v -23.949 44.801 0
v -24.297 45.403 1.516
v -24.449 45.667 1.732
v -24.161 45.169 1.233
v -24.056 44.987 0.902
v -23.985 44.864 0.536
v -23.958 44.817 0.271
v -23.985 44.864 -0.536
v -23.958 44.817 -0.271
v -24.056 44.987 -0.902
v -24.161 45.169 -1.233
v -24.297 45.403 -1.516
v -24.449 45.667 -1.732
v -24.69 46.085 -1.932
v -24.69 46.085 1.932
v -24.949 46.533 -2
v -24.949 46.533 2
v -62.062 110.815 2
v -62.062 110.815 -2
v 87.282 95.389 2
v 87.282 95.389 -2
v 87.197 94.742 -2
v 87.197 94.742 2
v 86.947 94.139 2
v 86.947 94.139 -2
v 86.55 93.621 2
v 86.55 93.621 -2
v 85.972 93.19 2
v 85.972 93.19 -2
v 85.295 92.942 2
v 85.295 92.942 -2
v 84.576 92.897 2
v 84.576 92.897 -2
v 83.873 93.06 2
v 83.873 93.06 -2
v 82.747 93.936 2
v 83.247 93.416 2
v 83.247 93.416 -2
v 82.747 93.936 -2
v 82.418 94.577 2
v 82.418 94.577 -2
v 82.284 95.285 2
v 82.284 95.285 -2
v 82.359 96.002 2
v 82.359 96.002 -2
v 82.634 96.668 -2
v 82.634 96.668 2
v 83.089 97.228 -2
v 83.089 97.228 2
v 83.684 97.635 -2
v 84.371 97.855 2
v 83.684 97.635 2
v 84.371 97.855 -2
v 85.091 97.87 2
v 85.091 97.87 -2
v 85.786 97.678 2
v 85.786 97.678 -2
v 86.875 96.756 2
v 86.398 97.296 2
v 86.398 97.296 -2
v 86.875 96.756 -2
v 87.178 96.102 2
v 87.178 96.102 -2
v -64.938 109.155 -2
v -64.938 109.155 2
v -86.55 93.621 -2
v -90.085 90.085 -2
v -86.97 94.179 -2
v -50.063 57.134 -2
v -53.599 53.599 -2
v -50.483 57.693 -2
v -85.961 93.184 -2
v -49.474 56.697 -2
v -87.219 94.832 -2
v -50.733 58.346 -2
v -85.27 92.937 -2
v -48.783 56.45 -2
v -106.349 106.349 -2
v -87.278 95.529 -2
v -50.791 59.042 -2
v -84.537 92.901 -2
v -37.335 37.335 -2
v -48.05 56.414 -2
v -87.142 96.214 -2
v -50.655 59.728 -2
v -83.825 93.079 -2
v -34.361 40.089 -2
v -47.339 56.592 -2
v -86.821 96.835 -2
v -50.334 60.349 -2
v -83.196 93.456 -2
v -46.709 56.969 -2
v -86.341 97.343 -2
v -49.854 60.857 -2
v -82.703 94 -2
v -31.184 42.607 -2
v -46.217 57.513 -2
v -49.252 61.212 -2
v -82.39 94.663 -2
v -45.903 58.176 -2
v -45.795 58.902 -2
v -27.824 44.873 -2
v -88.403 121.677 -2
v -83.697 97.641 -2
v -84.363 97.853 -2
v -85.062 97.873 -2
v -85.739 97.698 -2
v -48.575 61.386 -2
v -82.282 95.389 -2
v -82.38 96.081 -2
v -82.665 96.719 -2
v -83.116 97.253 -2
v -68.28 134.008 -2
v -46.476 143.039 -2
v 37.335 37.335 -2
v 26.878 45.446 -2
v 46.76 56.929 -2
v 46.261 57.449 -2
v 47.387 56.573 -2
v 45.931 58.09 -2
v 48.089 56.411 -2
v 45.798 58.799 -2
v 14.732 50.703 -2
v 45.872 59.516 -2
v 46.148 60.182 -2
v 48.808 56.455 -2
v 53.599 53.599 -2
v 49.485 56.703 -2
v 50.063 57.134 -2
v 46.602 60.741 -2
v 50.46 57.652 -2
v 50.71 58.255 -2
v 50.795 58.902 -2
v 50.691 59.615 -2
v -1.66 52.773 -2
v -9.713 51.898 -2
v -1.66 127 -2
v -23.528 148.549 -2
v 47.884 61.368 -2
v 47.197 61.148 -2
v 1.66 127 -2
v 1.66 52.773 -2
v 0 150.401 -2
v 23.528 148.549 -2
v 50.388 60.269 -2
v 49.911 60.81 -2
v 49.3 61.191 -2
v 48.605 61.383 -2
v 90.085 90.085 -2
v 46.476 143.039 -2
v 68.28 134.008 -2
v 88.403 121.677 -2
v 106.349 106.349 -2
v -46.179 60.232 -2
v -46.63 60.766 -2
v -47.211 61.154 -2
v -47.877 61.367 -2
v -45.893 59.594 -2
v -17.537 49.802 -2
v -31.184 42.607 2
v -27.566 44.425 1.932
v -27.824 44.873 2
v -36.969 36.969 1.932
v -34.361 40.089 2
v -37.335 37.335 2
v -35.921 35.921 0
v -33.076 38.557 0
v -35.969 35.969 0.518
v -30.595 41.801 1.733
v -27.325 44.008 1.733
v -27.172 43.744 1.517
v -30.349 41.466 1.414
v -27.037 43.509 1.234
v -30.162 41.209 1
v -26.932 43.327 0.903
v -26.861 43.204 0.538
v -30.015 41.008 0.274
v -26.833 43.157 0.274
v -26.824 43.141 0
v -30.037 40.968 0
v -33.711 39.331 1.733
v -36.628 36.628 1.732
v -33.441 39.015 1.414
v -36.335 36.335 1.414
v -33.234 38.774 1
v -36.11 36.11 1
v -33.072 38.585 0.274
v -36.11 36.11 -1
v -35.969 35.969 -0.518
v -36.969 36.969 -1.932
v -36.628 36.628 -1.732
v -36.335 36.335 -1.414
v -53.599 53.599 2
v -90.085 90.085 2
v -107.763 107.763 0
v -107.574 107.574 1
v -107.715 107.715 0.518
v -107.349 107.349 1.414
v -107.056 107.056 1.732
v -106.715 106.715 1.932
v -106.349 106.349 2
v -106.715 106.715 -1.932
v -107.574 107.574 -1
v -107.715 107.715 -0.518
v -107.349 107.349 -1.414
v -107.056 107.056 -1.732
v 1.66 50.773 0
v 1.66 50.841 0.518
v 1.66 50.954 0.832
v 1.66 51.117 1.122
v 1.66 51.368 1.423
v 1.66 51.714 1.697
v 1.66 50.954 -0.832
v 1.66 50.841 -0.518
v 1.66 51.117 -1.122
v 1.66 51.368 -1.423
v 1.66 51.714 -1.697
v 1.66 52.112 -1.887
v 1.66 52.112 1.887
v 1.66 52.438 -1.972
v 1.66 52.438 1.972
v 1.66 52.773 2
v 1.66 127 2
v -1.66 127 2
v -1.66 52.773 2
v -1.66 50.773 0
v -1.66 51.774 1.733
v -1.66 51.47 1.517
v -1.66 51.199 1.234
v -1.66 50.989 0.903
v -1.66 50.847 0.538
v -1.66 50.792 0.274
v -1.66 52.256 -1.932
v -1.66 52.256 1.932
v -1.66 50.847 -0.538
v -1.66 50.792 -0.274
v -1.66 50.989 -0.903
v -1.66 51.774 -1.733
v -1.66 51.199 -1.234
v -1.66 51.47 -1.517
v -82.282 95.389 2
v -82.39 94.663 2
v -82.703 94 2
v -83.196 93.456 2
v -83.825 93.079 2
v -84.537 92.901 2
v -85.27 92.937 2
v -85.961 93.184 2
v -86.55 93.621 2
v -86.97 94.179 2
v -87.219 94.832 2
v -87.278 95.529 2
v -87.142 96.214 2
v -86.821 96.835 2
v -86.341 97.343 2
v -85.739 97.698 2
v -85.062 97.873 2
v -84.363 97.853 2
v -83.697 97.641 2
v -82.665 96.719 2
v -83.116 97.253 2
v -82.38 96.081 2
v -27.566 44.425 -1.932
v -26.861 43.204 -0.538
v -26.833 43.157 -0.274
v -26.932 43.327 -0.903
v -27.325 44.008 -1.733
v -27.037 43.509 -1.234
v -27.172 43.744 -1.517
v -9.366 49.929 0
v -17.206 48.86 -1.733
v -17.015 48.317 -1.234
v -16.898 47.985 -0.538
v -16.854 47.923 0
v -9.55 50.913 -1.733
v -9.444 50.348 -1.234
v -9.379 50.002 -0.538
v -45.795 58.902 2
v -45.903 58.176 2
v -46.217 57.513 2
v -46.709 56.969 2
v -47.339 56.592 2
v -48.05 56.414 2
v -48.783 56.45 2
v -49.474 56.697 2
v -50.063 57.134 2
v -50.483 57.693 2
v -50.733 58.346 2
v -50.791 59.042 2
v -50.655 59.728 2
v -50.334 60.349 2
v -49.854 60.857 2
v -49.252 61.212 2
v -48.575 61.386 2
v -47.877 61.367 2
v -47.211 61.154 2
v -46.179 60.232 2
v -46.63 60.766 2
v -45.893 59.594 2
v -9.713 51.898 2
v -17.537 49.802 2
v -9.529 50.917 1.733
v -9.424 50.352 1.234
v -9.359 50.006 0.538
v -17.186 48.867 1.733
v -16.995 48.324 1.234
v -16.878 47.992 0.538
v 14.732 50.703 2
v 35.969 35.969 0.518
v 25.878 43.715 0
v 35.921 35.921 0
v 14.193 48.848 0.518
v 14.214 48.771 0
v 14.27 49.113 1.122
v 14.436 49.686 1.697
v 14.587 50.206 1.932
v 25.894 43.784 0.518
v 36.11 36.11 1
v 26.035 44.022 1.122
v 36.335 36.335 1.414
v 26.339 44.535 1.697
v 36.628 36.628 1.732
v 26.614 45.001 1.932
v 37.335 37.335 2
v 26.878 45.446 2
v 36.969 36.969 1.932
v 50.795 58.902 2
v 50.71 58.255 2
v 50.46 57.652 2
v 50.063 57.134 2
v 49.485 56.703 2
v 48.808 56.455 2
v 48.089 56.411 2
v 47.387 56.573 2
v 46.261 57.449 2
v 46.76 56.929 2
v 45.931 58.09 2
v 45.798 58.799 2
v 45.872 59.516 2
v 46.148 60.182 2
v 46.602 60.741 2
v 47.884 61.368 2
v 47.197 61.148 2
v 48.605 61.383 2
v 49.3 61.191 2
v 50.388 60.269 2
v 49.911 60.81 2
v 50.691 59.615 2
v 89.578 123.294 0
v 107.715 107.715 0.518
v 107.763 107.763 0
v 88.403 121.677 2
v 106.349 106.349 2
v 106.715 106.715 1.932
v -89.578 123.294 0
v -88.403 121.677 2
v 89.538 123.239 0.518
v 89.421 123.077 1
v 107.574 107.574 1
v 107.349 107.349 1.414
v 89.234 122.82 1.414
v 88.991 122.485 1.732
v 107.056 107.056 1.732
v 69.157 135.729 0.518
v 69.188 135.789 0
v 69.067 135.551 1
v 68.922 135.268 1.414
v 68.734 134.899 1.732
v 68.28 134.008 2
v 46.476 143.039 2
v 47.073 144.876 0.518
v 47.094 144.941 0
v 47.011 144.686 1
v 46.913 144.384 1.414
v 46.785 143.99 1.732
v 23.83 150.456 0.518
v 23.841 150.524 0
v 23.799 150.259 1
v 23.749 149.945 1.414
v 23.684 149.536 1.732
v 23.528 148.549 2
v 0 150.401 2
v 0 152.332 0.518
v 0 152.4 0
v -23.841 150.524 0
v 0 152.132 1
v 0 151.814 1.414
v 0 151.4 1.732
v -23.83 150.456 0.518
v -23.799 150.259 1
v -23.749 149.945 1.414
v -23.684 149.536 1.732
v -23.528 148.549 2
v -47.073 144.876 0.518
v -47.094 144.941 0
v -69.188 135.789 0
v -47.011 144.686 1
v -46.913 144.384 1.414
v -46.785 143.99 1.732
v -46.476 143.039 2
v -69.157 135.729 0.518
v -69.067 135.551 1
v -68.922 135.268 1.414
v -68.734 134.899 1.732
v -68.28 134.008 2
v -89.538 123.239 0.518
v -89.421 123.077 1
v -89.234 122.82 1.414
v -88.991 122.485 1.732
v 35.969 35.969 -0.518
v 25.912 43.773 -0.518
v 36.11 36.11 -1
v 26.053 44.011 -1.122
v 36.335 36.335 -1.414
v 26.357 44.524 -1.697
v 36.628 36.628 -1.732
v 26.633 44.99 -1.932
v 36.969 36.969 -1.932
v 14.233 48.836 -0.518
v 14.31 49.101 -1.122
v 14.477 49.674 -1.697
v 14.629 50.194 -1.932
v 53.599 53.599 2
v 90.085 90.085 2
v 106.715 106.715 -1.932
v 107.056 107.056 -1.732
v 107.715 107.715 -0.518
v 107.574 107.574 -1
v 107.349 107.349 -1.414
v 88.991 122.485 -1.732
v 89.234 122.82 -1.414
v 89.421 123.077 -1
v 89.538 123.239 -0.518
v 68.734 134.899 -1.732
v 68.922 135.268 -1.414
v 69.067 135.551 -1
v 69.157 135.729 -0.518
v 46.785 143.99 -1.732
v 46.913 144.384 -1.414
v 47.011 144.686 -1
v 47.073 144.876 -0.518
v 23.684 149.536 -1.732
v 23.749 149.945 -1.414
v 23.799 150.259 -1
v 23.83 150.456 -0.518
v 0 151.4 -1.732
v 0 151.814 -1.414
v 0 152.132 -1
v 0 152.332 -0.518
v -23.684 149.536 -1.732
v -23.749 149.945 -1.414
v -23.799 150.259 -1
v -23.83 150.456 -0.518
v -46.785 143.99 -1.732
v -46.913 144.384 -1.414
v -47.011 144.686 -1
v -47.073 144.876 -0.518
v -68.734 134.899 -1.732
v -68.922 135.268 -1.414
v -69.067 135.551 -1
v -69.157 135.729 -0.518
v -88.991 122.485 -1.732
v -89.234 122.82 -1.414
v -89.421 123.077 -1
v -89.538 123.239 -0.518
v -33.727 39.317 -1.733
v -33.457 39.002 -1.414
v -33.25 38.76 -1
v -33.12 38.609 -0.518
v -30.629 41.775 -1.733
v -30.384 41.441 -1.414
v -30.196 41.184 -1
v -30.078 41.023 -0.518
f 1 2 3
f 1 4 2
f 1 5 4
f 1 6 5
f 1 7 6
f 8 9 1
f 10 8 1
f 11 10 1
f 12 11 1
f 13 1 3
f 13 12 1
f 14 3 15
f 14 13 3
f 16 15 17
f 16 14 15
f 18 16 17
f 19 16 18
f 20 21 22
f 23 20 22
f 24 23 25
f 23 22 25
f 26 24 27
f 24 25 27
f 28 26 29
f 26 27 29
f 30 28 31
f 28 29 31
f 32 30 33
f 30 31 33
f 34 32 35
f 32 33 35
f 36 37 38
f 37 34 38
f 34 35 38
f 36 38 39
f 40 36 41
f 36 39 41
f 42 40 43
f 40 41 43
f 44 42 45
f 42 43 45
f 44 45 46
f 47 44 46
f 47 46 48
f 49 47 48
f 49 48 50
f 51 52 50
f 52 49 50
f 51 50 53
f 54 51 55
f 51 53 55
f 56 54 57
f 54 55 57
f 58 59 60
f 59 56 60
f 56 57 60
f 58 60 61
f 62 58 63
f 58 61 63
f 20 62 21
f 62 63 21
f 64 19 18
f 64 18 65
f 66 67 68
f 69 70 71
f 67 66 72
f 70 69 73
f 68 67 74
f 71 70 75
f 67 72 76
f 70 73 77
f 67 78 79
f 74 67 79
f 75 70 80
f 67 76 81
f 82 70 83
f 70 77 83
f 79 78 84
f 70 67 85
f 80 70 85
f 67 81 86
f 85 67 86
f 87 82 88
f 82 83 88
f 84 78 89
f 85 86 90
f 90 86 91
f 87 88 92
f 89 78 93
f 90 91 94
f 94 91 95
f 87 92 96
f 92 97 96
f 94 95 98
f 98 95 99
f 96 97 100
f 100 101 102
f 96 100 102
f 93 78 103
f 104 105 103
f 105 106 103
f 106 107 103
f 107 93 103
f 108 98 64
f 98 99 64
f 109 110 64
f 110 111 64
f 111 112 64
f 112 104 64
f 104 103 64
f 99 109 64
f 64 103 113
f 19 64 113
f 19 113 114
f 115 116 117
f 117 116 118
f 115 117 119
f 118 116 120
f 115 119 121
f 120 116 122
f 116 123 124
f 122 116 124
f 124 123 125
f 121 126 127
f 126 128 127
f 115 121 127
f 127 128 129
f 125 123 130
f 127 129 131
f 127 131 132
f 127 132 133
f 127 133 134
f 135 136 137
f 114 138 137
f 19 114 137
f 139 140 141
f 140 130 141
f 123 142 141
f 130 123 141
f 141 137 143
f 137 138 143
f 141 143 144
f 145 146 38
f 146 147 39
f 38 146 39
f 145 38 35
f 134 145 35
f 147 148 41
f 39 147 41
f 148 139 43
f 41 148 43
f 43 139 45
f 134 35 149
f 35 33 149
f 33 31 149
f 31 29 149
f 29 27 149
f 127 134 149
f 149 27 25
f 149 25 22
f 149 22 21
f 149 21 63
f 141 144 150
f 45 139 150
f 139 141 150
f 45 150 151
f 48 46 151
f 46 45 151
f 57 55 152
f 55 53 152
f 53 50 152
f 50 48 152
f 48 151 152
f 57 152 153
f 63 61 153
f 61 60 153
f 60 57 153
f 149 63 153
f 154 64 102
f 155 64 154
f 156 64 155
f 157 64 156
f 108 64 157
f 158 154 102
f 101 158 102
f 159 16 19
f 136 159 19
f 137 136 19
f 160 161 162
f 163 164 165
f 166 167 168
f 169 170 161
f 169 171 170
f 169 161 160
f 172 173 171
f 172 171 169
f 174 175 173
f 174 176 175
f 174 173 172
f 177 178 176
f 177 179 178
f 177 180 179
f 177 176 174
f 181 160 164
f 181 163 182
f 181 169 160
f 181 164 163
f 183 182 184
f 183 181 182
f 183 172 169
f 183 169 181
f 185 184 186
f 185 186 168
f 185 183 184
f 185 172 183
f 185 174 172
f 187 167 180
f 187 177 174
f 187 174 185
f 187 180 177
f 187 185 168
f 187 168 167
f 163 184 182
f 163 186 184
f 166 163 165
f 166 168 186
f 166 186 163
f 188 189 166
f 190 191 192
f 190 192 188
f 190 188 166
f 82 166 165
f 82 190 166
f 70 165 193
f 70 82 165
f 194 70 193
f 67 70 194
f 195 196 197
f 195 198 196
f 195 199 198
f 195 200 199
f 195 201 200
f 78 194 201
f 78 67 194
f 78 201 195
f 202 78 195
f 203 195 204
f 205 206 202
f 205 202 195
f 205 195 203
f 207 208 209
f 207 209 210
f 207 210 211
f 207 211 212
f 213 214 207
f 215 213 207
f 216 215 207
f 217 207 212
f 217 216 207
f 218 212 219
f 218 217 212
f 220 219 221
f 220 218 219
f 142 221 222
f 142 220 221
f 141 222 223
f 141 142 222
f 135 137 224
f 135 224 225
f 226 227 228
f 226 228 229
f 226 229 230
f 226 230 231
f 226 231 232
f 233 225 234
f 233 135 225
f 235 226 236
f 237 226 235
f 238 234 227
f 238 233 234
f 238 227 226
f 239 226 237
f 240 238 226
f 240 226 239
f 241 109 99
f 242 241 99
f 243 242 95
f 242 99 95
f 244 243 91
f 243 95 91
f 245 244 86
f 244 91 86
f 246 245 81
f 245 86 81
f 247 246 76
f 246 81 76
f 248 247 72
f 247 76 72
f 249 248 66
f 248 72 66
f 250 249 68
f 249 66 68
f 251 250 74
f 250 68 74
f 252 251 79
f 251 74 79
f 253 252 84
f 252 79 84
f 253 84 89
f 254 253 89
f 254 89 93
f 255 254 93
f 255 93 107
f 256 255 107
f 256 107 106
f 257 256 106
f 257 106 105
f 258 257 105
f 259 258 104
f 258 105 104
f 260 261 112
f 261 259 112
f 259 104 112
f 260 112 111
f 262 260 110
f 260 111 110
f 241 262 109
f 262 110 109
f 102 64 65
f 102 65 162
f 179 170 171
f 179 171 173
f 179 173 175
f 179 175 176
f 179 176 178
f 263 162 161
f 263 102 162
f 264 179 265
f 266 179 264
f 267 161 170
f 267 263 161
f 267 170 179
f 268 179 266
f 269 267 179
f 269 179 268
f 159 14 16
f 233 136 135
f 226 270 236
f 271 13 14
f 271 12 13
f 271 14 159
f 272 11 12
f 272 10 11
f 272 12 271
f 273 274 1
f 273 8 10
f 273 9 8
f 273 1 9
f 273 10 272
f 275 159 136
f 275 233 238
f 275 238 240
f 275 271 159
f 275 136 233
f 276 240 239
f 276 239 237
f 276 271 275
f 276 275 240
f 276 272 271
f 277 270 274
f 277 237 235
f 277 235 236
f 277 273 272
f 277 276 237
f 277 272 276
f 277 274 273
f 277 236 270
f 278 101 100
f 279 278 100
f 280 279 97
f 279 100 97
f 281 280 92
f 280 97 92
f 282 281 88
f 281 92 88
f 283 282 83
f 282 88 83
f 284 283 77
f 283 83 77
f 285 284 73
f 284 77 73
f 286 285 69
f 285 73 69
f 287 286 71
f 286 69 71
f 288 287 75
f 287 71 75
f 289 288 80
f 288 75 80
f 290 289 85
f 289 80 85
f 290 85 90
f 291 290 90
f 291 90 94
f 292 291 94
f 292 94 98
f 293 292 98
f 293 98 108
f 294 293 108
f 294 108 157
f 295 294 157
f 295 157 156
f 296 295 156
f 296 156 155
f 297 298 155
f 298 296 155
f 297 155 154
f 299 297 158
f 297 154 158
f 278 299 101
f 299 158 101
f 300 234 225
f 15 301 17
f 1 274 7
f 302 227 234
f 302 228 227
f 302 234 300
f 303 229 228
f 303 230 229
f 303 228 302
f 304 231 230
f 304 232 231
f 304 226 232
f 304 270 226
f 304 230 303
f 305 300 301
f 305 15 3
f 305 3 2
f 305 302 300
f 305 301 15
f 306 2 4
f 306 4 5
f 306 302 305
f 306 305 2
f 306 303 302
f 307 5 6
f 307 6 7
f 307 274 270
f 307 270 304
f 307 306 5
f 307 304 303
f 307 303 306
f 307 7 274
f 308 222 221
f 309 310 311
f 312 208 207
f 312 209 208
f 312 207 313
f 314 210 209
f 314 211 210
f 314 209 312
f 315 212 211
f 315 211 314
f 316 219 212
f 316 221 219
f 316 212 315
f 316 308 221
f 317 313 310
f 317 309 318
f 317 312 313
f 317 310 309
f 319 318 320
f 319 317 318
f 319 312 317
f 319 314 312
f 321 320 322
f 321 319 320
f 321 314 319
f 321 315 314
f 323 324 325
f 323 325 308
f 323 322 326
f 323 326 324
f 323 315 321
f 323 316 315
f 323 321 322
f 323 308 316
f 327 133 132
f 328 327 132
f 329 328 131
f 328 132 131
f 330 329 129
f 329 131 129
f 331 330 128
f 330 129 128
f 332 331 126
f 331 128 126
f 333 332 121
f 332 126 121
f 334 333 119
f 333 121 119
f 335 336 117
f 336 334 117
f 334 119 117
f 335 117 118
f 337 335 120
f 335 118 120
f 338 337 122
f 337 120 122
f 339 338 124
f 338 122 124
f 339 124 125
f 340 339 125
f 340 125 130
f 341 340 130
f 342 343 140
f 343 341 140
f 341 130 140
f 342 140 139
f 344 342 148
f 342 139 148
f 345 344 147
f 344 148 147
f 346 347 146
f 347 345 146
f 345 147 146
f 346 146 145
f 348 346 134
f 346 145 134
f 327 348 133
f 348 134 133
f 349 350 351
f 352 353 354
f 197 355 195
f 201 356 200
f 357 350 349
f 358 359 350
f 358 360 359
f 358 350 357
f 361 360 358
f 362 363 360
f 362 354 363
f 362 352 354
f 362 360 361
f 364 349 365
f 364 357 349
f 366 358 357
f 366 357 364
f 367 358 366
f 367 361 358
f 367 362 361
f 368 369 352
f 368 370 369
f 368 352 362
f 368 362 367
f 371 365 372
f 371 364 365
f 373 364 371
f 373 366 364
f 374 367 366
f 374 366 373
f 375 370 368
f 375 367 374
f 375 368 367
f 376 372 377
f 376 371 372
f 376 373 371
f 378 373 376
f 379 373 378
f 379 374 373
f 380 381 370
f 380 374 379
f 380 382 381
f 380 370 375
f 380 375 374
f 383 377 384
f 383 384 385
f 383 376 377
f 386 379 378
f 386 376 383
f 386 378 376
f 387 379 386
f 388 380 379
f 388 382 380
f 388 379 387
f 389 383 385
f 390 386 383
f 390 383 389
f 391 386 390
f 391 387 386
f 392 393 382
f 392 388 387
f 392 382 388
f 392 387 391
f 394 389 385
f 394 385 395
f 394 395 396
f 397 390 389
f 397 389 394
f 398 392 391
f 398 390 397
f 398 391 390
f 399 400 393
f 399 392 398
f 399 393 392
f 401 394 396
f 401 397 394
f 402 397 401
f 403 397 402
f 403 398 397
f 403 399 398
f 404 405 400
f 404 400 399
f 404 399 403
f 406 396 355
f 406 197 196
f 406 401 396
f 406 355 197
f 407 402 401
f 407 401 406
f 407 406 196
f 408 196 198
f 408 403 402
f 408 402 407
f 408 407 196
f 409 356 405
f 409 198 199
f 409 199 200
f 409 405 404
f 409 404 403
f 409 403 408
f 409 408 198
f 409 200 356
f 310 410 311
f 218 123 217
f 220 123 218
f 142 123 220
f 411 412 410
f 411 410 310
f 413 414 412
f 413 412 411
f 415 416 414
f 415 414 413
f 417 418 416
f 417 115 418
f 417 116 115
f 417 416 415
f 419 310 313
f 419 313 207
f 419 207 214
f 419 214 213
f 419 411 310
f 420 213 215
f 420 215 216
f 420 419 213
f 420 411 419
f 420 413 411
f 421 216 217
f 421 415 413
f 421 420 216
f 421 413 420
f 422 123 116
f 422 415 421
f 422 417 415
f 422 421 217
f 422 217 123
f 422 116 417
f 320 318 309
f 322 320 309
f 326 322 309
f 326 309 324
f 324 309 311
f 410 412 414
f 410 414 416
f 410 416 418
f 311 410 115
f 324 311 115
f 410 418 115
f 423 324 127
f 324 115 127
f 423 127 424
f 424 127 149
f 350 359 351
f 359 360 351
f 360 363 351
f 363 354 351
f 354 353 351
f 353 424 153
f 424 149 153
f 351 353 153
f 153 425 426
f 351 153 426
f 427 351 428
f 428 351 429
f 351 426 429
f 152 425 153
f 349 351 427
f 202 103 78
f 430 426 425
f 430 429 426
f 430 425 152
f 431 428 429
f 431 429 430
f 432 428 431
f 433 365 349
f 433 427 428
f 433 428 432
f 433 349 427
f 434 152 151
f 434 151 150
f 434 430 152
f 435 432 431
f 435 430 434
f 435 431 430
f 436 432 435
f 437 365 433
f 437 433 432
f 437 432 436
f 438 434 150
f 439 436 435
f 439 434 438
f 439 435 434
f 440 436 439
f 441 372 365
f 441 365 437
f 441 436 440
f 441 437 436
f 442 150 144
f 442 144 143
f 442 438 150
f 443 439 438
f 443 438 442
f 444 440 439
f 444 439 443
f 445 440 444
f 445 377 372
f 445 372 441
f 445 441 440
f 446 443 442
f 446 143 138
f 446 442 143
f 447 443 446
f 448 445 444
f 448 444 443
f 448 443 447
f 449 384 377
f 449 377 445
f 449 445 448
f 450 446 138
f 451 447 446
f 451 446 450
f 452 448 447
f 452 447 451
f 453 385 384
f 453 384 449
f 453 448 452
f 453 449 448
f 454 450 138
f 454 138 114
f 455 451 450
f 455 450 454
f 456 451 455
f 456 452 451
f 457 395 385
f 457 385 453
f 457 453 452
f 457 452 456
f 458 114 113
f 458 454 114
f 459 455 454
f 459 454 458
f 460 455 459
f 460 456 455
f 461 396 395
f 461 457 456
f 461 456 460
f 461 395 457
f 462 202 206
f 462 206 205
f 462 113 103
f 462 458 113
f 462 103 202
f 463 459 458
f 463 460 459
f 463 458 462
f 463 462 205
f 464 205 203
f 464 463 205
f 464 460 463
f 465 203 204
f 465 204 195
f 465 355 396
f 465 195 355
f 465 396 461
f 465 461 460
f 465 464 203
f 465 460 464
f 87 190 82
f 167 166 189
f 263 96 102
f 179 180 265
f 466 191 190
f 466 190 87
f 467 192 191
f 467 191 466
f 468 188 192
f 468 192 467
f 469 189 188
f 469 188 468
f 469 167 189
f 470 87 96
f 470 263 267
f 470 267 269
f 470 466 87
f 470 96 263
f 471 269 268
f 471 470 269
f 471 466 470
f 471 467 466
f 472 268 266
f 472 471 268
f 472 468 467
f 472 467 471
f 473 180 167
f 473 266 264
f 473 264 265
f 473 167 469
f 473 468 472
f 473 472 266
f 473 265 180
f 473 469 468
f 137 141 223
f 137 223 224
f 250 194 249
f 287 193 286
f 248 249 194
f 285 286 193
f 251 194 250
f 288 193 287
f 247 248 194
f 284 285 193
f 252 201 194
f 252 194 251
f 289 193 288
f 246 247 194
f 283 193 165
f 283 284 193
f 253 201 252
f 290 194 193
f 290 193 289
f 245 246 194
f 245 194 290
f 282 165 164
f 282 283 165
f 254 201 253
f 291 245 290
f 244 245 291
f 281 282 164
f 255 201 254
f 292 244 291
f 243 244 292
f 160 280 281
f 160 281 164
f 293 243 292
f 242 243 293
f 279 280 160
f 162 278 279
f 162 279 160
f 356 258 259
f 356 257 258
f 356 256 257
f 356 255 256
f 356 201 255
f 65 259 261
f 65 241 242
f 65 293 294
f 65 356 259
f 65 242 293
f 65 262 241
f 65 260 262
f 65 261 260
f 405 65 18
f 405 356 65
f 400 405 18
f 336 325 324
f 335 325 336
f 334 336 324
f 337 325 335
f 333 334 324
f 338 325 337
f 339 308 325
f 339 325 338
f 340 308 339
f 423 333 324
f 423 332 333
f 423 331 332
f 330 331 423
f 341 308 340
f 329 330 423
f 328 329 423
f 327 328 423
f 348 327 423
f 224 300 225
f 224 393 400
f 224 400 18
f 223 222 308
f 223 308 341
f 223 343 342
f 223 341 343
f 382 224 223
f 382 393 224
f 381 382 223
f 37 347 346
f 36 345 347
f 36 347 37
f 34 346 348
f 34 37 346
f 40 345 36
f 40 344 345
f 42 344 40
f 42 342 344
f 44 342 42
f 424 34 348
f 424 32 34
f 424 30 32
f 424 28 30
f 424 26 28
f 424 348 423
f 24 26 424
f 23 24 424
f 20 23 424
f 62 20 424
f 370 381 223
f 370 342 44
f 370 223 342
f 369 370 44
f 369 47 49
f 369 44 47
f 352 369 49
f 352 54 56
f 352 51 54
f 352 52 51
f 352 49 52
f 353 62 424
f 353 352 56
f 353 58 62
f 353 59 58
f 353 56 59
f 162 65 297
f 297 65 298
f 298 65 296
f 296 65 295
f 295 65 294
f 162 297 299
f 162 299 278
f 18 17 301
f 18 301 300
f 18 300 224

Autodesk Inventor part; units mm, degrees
ref_plane "YZ Plane" through (0, 0, 0) normal (1, 0, 0) x (0, 1, 0)
ref_plane "XZ Plane" through (0, 0, 0) normal (0, 1, 0) x (-1, 0, 0)
ref_plane "XY Plane" through (0, 0, 0) normal (0, 0, 1) x (1, 0, 0)
sketch "Sketch1" plane through (0, 0, 0) normal (0, 0, 1) x (1, 0, 0)
  arc A0 (107.7631, -107.7631) -> (-107.7631, 107.7631) centre (0, 0) ccw
  line L0 (152.4, 0) -> (127, 0)
  line L1 (127, -1.66) -> (127, 1.66)
  line L2 (127, 1.66) -> (50.7729, 1.66)
  line L3 (50.7729, -1.66) -> (127, -1.66)
  line L4 (-64.9376, 109.1552) -> (-26.824, 43.1406)
  line L5 (-23.9488, 44.8006) -> (-62.0624, 110.8152)
  line L6 (-1.66, 127) -> (-1.66, 50.7729)
  line L7 (1.66, 50.7729) -> (1.66, 127)
  line L8 (1.66, 127) -> (-1.66, 127)
  line L9 (-62.0624, 110.8152) -> (-64.9376, 109.1552)
  line L10 (35.921, 35.921) -> (107.7631, 107.7631)
  line L11 (0, 0) -> (152.4, 0) construction
  line L12 (0, 0) -> (152.4, 0) construction
  line L13 (107.7631, -107.7631) -> (35.921, -35.921)
  line L14 (-35.921, 35.921) -> (-107.7631, 107.7631)
  arc A1 (-26.824, 43.1406) -> (-35.921, 35.921) centre (0, 0) ccw
  arc A2 (35.921, -35.921) -> (1.66, 50.7729) centre (0, 0) ccw
  arc A3 (-1.66, 50.7729) -> (-23.9488, 44.8006) centre (0, 0) ccw
  line L15 (35.921, 35.921) -> (53.5987, 53.5987)
  line L16 (107.7631, 107.7631) -> (90.0854, 90.0854)
  circle A4 centre (53.5987, 53.5987) radius 15
  line L17 (53.5987, 53.5987) -> (58.902, 48.2954)
  line L18 (53.5987, 53.5987) -> (48.2954, 58.902)
  circle A5 centre (48.2954, 58.902) radius 2.5
  circle A6 centre (58.902, 48.2954) radius 2.5
  circle A7 centre (90.0854, 90.0854) radius 15
  line L19 (90.0854, 90.0854) -> (95.3887, 84.7821)
  line L20 (90.0854, 90.0854) -> (84.7821, 95.3887)
  circle A8 centre (84.7821, 95.3887) radius 2.5
  circle A9 centre (95.3887, 84.7821) radius 2.5
  line L21 (-90.0854, 90.0854) -> (-84.7821, 95.3887)
  circle A10 centre (-84.7821, 95.3887) radius 2.5
  circle A11 centre (-90.0854, 90.0854) radius 15
  line L22 (-90.0854, 90.0854) -> (-95.3887, 84.7821)
  circle A12 centre (-95.3887, 84.7821) radius 2.5
  circle A13 centre (-58.902, 48.2954) radius 2.5
  circle A14 centre (-53.5987, 53.5987) radius 15
  line L23 (-53.5987, 53.5987) -> (-58.902, 48.2954)
  circle A15 centre (-48.2954, 58.902) radius 2.5
  line L24 (-53.5987, 53.5987) -> (-48.2954, 58.902)
  line L25 (90.0854, -90.0854) -> (84.7821, -95.3887)
  circle A16 centre (84.7821, -95.3887) radius 2.5
  circle A17 centre (90.0854, -90.0854) radius 15
  line L26 (90.0854, -90.0854) -> (95.3887, -84.7821)
  circle A18 centre (95.3887, -84.7821) radius 2.5
  circle A19 centre (58.902, -48.2954) radius 2.5
  circle A20 centre (53.5987, -53.5987) radius 15
  line L27 (53.5987, -53.5987) -> (58.902, -48.2954)
  circle A21 centre (48.2954, -58.902) radius 2.5
  line L28 (53.5987, -53.5987) -> (48.2954, -58.902)
  point P0 (50.8, 0)
  dimension "d2" = 25.4
  dimension "d3" = 3.32
  dimension "d10" = 45
  dimension "d12" = 25
  dimension "d13" = 25
  dimension "d14" = 30
  dimension "d15" = 7.5
  dimension "d16" = 7.5
  dimension "d17" = 5
  dimension "d18" = 5
  dimension "d19" = 30
  dimension "d20" = 7.5
  dimension "d21" = 7.5
  dimension "d22" = 5
  dimension "d23" = 5
extrude "Extrusion2" [suppressed]
extrude "Extrusion3" [suppressed]
extrude "Extrusion4" add sketch "Sketch1" along normal mid plane 4 contours L10 A7 A4 A2 L7 L8 L6 A3 L5 L9 L4 A1 L14 A14 A11 A0 | L10 A7 | A11 L14 | L10 A4 | A14 L14 picked at (92.6865, 95.3887) picked at (-92.6855, 95.3478) picked at (56.1998, 58.902) picked at (-56.1988, 58.8611)
fillet "Fillet1" [suppressed]
fillet "Fillet2" radius 2 6 edges at (-31.5795, 39.7916, 2) (-31.5795, 39.7916, -2) (-13.148, 49.069, 2) (-13.148, 49.069, -2) (20.2046, 46.6091, 2) (20.2046, 46.6091, -2)
fillet "Fillet3" radius 2 2 edges at (0, 152.4, 2) (0, 152.4, -2)
properties part number "fin_alignment_rig_part1"
